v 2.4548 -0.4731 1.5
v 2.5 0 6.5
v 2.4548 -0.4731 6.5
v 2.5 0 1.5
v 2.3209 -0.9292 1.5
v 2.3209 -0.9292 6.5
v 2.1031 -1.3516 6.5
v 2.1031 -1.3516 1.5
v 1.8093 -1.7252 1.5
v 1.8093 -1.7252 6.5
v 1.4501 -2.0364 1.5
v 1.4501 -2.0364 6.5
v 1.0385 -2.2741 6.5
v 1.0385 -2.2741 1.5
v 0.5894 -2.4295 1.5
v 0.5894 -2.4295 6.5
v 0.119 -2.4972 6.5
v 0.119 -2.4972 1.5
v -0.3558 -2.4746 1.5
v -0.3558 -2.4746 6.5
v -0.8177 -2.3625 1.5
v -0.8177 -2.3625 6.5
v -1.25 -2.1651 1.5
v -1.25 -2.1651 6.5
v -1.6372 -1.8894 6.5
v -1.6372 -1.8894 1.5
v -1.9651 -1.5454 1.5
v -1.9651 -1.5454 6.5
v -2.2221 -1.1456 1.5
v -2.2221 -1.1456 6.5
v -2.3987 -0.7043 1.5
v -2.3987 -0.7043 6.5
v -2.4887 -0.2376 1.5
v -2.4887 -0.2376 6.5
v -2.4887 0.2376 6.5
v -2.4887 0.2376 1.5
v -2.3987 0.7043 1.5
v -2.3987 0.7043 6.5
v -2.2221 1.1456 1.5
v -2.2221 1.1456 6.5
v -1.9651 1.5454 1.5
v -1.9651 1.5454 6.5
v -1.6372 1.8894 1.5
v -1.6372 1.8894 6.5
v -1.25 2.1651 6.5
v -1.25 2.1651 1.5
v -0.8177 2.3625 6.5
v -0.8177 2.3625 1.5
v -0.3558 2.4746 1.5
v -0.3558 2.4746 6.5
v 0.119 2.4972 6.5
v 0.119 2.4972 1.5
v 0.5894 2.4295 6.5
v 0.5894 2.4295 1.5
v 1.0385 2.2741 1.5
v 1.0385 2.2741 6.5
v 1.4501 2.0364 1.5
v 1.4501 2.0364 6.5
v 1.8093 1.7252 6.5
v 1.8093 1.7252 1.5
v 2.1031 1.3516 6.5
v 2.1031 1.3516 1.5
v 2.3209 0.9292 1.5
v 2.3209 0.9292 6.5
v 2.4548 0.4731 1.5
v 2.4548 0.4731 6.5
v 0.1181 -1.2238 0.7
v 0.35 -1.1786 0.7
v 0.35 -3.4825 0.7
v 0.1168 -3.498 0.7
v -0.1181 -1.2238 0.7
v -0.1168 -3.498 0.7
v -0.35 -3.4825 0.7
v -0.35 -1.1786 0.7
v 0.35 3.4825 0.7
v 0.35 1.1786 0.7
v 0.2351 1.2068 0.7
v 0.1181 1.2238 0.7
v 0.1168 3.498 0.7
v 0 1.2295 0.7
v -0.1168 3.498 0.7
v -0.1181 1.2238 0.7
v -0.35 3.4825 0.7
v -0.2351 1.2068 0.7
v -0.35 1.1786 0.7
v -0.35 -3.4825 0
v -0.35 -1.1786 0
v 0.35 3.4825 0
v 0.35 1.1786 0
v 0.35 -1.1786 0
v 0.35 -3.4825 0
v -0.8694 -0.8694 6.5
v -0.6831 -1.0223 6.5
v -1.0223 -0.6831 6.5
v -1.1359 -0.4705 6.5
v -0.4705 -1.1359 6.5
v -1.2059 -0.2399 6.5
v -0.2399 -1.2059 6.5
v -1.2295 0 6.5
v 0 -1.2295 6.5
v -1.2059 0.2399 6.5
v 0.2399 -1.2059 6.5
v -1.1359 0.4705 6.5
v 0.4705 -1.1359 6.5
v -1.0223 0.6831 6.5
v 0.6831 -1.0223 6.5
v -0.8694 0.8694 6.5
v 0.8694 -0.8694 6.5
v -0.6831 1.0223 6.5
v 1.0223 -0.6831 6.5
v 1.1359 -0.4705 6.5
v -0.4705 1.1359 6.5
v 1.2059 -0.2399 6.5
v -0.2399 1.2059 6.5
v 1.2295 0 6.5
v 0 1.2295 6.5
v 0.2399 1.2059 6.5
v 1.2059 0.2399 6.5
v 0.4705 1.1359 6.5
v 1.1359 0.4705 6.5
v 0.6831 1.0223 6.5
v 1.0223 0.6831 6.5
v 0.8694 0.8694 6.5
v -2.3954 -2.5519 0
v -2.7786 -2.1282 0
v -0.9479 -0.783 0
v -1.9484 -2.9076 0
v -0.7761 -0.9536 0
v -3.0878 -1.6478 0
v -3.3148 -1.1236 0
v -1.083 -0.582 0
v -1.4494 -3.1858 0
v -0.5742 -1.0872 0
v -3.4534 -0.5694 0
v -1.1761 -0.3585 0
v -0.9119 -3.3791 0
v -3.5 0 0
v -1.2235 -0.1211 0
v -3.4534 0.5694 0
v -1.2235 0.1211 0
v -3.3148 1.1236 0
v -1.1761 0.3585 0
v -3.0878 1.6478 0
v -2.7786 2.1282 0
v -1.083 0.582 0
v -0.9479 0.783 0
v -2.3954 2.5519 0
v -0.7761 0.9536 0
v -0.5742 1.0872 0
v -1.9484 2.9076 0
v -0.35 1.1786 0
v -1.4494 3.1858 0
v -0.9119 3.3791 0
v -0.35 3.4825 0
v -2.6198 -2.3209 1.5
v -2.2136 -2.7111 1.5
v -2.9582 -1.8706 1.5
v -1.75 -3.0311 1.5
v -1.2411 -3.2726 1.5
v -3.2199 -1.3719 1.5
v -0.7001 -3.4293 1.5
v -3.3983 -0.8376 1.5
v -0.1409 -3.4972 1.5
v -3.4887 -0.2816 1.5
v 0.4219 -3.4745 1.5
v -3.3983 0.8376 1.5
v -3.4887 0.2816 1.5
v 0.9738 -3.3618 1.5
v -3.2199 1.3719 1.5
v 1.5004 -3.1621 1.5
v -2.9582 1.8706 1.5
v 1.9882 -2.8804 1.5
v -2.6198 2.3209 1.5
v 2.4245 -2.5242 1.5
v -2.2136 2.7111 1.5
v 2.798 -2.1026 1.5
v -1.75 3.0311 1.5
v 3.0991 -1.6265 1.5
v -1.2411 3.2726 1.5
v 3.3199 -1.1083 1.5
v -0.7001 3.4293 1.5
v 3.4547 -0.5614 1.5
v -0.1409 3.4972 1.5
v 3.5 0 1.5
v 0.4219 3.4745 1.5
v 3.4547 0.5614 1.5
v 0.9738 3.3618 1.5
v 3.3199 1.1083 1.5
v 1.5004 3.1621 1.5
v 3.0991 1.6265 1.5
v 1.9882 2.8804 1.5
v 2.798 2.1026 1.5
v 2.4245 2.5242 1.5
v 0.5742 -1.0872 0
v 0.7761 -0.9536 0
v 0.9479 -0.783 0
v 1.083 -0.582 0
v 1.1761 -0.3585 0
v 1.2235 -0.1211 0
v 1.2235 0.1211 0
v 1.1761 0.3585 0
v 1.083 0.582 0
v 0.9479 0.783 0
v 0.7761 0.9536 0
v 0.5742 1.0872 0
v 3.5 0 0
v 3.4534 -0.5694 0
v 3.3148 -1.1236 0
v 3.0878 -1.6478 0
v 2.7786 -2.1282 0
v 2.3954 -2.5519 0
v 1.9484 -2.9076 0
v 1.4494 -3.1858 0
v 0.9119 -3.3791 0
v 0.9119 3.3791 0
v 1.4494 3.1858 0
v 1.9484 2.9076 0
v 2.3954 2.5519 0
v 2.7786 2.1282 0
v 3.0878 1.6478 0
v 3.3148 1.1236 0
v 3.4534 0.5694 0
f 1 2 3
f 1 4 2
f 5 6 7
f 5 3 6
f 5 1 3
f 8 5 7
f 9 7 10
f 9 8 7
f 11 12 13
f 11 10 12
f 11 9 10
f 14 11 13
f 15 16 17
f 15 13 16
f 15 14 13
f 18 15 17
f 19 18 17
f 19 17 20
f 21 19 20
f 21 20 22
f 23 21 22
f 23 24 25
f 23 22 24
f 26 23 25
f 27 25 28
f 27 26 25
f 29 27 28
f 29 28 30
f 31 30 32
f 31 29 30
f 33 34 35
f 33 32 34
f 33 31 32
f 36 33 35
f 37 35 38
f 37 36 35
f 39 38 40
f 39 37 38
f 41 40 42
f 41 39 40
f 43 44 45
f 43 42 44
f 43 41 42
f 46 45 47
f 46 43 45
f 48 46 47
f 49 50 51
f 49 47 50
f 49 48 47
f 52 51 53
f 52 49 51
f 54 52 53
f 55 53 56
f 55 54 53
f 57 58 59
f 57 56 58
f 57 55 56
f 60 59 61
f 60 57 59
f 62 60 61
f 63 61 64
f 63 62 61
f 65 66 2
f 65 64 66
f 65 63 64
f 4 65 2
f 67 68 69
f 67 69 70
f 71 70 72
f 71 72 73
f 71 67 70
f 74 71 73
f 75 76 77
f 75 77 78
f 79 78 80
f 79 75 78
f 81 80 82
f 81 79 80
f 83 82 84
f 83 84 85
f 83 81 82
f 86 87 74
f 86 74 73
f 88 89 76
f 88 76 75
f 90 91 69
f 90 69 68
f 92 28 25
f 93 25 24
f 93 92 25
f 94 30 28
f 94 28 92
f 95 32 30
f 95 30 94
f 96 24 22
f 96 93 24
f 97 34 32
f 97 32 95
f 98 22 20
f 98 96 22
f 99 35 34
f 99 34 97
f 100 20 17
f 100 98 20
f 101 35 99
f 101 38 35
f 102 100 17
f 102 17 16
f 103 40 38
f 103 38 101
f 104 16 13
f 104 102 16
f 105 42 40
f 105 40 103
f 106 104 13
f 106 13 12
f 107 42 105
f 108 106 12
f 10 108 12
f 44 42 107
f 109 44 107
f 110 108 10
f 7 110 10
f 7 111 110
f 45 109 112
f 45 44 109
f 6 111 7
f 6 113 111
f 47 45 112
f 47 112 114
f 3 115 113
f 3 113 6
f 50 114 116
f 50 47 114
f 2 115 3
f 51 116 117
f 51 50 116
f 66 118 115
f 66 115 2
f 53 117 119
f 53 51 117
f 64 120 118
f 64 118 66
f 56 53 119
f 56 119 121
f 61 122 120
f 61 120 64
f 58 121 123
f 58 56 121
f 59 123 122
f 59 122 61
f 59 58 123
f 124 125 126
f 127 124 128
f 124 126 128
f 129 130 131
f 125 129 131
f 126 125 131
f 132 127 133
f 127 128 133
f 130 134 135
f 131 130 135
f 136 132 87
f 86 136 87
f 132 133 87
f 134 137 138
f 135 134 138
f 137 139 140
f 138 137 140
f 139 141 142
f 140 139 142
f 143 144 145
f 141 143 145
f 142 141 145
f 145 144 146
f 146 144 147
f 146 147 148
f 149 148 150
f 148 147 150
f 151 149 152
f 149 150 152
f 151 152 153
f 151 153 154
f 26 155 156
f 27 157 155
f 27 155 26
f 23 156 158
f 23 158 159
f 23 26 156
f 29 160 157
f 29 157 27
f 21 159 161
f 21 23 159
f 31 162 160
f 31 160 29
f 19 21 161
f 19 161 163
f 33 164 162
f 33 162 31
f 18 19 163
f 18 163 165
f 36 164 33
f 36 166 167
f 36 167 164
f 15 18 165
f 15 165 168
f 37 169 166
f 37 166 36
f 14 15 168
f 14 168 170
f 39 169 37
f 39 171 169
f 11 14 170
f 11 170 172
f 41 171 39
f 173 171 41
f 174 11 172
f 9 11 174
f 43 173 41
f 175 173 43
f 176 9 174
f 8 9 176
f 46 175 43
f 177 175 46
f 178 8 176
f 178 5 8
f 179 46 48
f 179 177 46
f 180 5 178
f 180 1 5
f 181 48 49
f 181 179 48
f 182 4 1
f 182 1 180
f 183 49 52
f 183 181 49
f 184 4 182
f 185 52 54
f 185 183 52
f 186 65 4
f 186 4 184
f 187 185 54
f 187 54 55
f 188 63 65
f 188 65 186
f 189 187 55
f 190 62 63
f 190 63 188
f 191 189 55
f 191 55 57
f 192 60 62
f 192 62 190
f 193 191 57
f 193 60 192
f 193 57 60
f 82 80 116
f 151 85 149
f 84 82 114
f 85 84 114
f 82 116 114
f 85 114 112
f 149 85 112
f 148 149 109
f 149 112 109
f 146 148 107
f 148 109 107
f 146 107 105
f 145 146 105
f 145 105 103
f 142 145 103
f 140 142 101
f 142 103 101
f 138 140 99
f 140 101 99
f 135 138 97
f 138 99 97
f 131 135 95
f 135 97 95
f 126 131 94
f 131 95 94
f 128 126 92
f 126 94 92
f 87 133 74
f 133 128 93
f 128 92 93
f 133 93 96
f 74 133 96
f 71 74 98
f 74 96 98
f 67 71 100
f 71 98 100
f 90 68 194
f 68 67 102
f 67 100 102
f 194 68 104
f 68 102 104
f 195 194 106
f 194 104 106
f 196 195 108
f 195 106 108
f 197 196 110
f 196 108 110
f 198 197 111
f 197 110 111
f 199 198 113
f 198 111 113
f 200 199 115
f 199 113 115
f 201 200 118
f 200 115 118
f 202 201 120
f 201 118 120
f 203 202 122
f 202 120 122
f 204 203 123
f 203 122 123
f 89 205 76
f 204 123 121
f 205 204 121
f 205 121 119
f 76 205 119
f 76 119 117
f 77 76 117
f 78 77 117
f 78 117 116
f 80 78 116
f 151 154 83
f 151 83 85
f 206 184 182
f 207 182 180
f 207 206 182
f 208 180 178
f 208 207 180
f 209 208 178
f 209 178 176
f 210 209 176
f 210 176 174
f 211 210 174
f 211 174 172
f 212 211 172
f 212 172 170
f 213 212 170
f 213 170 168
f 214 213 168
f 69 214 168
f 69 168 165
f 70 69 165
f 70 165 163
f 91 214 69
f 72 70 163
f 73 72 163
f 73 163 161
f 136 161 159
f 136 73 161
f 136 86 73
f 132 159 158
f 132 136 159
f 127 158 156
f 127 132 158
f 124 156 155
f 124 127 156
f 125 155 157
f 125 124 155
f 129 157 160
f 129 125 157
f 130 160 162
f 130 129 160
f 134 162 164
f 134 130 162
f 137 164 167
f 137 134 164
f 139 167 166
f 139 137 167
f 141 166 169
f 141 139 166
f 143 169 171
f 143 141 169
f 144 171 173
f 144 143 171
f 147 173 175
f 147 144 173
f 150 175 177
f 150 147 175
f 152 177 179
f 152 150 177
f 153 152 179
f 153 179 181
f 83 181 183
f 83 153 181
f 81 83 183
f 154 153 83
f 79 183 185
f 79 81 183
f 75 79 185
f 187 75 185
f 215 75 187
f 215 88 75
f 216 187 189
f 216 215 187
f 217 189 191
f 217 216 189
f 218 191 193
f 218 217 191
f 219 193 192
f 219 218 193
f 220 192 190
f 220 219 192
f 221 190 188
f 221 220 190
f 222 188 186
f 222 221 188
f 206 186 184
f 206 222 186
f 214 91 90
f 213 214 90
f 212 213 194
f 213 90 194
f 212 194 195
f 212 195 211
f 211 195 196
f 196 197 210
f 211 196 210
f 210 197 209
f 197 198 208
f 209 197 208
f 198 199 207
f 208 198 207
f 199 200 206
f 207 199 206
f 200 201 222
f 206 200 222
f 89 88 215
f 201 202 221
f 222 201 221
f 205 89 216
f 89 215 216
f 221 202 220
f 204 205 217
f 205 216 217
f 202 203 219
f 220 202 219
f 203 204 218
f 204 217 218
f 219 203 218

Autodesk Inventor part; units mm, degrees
ref_plane "YZ Plane" through (0, 0, 0) normal (1, 0, 0) x (0, 1, 0)
ref_plane "XZ Plane" through (0, 0, 0) normal (0, 1, 0) x (-1, 0, 0)
ref_plane "XY Plane" through (0, 0, 0) normal (0, 0, 1) x (1, 0, 0)
sketch "Sketch1" plane through (0, 0, 0) normal (0, 0, 1) x (1, 0, 0)
  circle A0 centre (0, 0) radius 3.5
  dimension "d0" = 7
extrude "Extrusion1" add sketch "Sketch1" along normal blind 1.5
sketch "Sketch2" plane through (0, 0, 1.5) normal (0, 0, 1) x (1, 0, 0)
  circle A0 centre (0, 0) radius 2.5
  dimension "d3" = 5
extrude "Extrusion2" add sketch "Sketch2" along normal blind 5
sketch "Sketch3" plane through (0, 0, 0) normal (0, 0, -1) x (-1, 0, 0)
  circle A0 centre (0, 0) radius 3.5 projected
hole "Hole1" at (0, 0, 0) direction (0, 0, 1) diameter 2.459 end through all thread size "M3x0.5" class "6H" standard "ISO Metric profile"
sketch "Sketch4" plane through (0, 0, 0) normal (0, 0, -1) x (-1, 0, 0)
  line L0 (-0.35, 3.9217) -> (0.35, 3.9217)
  line L1 (0.35, 3.9217) -> (0.35, -3.9092)
  line L2 (0.35, -3.9092) -> (-0.35, -3.9092)
  line L3 (-0.35, -3.9092) -> (-0.35, 3.9217)
  point P0 (0, 0)
  dimension "d13" = 0.7
  dimension "d14" = 0.35
extrude "Extrusion3" cut sketch "Sketch4" against normal blind 0.7
thread "Thread1" size "M5x0.8" class "6g" standard "ANSI Metric M Profile" full length
equation "\"d14\" = 0.5 * d13"
properties part number "screw-mount"
